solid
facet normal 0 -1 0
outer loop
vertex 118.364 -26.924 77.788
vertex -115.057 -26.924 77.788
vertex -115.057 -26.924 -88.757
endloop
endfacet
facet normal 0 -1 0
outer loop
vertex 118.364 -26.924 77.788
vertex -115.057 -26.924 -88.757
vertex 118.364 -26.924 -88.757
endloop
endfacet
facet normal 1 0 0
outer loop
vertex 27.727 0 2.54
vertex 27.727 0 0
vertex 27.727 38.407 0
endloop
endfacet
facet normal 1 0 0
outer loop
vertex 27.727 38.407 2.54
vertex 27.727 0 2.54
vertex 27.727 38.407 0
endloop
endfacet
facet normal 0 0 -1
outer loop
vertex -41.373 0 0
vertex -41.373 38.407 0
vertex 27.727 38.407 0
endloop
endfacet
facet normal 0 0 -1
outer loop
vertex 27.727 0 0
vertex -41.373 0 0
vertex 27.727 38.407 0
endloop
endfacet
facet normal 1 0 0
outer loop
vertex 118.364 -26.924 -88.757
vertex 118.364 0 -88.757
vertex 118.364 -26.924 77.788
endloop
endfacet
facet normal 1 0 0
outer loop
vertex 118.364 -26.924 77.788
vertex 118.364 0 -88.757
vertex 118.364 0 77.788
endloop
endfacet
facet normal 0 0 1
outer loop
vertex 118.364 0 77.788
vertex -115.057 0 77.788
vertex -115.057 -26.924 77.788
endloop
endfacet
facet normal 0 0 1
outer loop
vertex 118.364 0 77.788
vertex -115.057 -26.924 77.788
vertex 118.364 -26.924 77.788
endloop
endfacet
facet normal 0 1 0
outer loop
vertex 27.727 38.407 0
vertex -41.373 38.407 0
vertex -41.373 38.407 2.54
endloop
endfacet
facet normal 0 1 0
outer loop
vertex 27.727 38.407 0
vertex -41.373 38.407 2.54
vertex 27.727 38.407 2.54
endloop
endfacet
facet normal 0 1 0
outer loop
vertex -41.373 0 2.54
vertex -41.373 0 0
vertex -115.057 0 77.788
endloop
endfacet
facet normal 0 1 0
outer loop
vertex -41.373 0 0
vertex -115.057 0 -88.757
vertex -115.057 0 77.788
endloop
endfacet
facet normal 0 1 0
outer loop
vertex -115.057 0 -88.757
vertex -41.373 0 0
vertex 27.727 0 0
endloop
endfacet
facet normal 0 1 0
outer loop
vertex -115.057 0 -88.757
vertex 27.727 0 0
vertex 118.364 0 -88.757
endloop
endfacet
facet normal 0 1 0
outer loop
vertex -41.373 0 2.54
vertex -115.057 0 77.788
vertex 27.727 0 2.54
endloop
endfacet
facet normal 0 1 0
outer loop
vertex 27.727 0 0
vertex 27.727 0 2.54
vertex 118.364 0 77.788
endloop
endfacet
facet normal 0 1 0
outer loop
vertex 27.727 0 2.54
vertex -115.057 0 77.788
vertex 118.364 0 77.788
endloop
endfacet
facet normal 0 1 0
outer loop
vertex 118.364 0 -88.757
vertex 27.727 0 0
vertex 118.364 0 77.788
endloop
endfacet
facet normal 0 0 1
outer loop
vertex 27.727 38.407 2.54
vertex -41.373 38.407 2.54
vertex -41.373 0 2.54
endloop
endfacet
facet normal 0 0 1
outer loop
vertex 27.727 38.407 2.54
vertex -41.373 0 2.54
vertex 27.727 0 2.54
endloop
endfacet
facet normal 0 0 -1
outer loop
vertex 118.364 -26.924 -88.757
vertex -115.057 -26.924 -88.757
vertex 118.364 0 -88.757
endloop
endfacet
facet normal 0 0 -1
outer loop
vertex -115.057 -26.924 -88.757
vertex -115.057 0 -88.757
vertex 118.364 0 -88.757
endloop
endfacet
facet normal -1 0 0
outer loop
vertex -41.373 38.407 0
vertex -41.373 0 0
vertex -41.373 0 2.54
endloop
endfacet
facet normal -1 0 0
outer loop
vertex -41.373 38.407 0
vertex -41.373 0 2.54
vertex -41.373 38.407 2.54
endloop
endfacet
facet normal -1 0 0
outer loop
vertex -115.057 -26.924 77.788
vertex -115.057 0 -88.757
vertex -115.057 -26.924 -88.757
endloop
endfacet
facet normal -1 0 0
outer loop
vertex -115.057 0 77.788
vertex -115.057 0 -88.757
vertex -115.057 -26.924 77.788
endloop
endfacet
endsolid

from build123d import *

# Parameters (mm, degrees)
F0_W     = 233.420394361
F0_H     = 166.5441393852
F1_DEPTH = 1.27
F2_DEPTH = 0.254
F3_DEPTH = 25.4
F4_W     = 69.0996274352
F4_H     = 38.4067334235
F5_DEPTH = 2.54


with BuildPart() as f1:
    # F0 (on Front) → F1 (new body)
    with BuildSketch(Plane.XZ):
        with Locations((1.6535334289, -5.4845437407)):
            Rectangle(F0_W, F0_H)
    extrude(amount=F1_DEPTH)

    # F2 (add): a face of the model
    f2_faces = [f1.faces().sort_by_distance(p)[0] for p in [
        (1.6535334289, -1.27, -5.4845437407),
    ]]
    extrude(f2_faces, amount=F2_DEPTH)

    # F3 (add): a face of the model
    f3_faces = [f1.faces().sort_by_distance(p)[0] for p in [
        (1.6535334289, -1.524, -5.4845437407),
    ]]
    extrude(f3_faces, amount=F3_DEPTH)

    # F4 (on Top) → F5 (join)
    with BuildSketch(Plane.XY):
        with Locations((-6.8230740726, 19.2033667117)):
            Rectangle(F4_W, F4_H)
    extrude(amount=F5_DEPTH)


solid = f1.part
